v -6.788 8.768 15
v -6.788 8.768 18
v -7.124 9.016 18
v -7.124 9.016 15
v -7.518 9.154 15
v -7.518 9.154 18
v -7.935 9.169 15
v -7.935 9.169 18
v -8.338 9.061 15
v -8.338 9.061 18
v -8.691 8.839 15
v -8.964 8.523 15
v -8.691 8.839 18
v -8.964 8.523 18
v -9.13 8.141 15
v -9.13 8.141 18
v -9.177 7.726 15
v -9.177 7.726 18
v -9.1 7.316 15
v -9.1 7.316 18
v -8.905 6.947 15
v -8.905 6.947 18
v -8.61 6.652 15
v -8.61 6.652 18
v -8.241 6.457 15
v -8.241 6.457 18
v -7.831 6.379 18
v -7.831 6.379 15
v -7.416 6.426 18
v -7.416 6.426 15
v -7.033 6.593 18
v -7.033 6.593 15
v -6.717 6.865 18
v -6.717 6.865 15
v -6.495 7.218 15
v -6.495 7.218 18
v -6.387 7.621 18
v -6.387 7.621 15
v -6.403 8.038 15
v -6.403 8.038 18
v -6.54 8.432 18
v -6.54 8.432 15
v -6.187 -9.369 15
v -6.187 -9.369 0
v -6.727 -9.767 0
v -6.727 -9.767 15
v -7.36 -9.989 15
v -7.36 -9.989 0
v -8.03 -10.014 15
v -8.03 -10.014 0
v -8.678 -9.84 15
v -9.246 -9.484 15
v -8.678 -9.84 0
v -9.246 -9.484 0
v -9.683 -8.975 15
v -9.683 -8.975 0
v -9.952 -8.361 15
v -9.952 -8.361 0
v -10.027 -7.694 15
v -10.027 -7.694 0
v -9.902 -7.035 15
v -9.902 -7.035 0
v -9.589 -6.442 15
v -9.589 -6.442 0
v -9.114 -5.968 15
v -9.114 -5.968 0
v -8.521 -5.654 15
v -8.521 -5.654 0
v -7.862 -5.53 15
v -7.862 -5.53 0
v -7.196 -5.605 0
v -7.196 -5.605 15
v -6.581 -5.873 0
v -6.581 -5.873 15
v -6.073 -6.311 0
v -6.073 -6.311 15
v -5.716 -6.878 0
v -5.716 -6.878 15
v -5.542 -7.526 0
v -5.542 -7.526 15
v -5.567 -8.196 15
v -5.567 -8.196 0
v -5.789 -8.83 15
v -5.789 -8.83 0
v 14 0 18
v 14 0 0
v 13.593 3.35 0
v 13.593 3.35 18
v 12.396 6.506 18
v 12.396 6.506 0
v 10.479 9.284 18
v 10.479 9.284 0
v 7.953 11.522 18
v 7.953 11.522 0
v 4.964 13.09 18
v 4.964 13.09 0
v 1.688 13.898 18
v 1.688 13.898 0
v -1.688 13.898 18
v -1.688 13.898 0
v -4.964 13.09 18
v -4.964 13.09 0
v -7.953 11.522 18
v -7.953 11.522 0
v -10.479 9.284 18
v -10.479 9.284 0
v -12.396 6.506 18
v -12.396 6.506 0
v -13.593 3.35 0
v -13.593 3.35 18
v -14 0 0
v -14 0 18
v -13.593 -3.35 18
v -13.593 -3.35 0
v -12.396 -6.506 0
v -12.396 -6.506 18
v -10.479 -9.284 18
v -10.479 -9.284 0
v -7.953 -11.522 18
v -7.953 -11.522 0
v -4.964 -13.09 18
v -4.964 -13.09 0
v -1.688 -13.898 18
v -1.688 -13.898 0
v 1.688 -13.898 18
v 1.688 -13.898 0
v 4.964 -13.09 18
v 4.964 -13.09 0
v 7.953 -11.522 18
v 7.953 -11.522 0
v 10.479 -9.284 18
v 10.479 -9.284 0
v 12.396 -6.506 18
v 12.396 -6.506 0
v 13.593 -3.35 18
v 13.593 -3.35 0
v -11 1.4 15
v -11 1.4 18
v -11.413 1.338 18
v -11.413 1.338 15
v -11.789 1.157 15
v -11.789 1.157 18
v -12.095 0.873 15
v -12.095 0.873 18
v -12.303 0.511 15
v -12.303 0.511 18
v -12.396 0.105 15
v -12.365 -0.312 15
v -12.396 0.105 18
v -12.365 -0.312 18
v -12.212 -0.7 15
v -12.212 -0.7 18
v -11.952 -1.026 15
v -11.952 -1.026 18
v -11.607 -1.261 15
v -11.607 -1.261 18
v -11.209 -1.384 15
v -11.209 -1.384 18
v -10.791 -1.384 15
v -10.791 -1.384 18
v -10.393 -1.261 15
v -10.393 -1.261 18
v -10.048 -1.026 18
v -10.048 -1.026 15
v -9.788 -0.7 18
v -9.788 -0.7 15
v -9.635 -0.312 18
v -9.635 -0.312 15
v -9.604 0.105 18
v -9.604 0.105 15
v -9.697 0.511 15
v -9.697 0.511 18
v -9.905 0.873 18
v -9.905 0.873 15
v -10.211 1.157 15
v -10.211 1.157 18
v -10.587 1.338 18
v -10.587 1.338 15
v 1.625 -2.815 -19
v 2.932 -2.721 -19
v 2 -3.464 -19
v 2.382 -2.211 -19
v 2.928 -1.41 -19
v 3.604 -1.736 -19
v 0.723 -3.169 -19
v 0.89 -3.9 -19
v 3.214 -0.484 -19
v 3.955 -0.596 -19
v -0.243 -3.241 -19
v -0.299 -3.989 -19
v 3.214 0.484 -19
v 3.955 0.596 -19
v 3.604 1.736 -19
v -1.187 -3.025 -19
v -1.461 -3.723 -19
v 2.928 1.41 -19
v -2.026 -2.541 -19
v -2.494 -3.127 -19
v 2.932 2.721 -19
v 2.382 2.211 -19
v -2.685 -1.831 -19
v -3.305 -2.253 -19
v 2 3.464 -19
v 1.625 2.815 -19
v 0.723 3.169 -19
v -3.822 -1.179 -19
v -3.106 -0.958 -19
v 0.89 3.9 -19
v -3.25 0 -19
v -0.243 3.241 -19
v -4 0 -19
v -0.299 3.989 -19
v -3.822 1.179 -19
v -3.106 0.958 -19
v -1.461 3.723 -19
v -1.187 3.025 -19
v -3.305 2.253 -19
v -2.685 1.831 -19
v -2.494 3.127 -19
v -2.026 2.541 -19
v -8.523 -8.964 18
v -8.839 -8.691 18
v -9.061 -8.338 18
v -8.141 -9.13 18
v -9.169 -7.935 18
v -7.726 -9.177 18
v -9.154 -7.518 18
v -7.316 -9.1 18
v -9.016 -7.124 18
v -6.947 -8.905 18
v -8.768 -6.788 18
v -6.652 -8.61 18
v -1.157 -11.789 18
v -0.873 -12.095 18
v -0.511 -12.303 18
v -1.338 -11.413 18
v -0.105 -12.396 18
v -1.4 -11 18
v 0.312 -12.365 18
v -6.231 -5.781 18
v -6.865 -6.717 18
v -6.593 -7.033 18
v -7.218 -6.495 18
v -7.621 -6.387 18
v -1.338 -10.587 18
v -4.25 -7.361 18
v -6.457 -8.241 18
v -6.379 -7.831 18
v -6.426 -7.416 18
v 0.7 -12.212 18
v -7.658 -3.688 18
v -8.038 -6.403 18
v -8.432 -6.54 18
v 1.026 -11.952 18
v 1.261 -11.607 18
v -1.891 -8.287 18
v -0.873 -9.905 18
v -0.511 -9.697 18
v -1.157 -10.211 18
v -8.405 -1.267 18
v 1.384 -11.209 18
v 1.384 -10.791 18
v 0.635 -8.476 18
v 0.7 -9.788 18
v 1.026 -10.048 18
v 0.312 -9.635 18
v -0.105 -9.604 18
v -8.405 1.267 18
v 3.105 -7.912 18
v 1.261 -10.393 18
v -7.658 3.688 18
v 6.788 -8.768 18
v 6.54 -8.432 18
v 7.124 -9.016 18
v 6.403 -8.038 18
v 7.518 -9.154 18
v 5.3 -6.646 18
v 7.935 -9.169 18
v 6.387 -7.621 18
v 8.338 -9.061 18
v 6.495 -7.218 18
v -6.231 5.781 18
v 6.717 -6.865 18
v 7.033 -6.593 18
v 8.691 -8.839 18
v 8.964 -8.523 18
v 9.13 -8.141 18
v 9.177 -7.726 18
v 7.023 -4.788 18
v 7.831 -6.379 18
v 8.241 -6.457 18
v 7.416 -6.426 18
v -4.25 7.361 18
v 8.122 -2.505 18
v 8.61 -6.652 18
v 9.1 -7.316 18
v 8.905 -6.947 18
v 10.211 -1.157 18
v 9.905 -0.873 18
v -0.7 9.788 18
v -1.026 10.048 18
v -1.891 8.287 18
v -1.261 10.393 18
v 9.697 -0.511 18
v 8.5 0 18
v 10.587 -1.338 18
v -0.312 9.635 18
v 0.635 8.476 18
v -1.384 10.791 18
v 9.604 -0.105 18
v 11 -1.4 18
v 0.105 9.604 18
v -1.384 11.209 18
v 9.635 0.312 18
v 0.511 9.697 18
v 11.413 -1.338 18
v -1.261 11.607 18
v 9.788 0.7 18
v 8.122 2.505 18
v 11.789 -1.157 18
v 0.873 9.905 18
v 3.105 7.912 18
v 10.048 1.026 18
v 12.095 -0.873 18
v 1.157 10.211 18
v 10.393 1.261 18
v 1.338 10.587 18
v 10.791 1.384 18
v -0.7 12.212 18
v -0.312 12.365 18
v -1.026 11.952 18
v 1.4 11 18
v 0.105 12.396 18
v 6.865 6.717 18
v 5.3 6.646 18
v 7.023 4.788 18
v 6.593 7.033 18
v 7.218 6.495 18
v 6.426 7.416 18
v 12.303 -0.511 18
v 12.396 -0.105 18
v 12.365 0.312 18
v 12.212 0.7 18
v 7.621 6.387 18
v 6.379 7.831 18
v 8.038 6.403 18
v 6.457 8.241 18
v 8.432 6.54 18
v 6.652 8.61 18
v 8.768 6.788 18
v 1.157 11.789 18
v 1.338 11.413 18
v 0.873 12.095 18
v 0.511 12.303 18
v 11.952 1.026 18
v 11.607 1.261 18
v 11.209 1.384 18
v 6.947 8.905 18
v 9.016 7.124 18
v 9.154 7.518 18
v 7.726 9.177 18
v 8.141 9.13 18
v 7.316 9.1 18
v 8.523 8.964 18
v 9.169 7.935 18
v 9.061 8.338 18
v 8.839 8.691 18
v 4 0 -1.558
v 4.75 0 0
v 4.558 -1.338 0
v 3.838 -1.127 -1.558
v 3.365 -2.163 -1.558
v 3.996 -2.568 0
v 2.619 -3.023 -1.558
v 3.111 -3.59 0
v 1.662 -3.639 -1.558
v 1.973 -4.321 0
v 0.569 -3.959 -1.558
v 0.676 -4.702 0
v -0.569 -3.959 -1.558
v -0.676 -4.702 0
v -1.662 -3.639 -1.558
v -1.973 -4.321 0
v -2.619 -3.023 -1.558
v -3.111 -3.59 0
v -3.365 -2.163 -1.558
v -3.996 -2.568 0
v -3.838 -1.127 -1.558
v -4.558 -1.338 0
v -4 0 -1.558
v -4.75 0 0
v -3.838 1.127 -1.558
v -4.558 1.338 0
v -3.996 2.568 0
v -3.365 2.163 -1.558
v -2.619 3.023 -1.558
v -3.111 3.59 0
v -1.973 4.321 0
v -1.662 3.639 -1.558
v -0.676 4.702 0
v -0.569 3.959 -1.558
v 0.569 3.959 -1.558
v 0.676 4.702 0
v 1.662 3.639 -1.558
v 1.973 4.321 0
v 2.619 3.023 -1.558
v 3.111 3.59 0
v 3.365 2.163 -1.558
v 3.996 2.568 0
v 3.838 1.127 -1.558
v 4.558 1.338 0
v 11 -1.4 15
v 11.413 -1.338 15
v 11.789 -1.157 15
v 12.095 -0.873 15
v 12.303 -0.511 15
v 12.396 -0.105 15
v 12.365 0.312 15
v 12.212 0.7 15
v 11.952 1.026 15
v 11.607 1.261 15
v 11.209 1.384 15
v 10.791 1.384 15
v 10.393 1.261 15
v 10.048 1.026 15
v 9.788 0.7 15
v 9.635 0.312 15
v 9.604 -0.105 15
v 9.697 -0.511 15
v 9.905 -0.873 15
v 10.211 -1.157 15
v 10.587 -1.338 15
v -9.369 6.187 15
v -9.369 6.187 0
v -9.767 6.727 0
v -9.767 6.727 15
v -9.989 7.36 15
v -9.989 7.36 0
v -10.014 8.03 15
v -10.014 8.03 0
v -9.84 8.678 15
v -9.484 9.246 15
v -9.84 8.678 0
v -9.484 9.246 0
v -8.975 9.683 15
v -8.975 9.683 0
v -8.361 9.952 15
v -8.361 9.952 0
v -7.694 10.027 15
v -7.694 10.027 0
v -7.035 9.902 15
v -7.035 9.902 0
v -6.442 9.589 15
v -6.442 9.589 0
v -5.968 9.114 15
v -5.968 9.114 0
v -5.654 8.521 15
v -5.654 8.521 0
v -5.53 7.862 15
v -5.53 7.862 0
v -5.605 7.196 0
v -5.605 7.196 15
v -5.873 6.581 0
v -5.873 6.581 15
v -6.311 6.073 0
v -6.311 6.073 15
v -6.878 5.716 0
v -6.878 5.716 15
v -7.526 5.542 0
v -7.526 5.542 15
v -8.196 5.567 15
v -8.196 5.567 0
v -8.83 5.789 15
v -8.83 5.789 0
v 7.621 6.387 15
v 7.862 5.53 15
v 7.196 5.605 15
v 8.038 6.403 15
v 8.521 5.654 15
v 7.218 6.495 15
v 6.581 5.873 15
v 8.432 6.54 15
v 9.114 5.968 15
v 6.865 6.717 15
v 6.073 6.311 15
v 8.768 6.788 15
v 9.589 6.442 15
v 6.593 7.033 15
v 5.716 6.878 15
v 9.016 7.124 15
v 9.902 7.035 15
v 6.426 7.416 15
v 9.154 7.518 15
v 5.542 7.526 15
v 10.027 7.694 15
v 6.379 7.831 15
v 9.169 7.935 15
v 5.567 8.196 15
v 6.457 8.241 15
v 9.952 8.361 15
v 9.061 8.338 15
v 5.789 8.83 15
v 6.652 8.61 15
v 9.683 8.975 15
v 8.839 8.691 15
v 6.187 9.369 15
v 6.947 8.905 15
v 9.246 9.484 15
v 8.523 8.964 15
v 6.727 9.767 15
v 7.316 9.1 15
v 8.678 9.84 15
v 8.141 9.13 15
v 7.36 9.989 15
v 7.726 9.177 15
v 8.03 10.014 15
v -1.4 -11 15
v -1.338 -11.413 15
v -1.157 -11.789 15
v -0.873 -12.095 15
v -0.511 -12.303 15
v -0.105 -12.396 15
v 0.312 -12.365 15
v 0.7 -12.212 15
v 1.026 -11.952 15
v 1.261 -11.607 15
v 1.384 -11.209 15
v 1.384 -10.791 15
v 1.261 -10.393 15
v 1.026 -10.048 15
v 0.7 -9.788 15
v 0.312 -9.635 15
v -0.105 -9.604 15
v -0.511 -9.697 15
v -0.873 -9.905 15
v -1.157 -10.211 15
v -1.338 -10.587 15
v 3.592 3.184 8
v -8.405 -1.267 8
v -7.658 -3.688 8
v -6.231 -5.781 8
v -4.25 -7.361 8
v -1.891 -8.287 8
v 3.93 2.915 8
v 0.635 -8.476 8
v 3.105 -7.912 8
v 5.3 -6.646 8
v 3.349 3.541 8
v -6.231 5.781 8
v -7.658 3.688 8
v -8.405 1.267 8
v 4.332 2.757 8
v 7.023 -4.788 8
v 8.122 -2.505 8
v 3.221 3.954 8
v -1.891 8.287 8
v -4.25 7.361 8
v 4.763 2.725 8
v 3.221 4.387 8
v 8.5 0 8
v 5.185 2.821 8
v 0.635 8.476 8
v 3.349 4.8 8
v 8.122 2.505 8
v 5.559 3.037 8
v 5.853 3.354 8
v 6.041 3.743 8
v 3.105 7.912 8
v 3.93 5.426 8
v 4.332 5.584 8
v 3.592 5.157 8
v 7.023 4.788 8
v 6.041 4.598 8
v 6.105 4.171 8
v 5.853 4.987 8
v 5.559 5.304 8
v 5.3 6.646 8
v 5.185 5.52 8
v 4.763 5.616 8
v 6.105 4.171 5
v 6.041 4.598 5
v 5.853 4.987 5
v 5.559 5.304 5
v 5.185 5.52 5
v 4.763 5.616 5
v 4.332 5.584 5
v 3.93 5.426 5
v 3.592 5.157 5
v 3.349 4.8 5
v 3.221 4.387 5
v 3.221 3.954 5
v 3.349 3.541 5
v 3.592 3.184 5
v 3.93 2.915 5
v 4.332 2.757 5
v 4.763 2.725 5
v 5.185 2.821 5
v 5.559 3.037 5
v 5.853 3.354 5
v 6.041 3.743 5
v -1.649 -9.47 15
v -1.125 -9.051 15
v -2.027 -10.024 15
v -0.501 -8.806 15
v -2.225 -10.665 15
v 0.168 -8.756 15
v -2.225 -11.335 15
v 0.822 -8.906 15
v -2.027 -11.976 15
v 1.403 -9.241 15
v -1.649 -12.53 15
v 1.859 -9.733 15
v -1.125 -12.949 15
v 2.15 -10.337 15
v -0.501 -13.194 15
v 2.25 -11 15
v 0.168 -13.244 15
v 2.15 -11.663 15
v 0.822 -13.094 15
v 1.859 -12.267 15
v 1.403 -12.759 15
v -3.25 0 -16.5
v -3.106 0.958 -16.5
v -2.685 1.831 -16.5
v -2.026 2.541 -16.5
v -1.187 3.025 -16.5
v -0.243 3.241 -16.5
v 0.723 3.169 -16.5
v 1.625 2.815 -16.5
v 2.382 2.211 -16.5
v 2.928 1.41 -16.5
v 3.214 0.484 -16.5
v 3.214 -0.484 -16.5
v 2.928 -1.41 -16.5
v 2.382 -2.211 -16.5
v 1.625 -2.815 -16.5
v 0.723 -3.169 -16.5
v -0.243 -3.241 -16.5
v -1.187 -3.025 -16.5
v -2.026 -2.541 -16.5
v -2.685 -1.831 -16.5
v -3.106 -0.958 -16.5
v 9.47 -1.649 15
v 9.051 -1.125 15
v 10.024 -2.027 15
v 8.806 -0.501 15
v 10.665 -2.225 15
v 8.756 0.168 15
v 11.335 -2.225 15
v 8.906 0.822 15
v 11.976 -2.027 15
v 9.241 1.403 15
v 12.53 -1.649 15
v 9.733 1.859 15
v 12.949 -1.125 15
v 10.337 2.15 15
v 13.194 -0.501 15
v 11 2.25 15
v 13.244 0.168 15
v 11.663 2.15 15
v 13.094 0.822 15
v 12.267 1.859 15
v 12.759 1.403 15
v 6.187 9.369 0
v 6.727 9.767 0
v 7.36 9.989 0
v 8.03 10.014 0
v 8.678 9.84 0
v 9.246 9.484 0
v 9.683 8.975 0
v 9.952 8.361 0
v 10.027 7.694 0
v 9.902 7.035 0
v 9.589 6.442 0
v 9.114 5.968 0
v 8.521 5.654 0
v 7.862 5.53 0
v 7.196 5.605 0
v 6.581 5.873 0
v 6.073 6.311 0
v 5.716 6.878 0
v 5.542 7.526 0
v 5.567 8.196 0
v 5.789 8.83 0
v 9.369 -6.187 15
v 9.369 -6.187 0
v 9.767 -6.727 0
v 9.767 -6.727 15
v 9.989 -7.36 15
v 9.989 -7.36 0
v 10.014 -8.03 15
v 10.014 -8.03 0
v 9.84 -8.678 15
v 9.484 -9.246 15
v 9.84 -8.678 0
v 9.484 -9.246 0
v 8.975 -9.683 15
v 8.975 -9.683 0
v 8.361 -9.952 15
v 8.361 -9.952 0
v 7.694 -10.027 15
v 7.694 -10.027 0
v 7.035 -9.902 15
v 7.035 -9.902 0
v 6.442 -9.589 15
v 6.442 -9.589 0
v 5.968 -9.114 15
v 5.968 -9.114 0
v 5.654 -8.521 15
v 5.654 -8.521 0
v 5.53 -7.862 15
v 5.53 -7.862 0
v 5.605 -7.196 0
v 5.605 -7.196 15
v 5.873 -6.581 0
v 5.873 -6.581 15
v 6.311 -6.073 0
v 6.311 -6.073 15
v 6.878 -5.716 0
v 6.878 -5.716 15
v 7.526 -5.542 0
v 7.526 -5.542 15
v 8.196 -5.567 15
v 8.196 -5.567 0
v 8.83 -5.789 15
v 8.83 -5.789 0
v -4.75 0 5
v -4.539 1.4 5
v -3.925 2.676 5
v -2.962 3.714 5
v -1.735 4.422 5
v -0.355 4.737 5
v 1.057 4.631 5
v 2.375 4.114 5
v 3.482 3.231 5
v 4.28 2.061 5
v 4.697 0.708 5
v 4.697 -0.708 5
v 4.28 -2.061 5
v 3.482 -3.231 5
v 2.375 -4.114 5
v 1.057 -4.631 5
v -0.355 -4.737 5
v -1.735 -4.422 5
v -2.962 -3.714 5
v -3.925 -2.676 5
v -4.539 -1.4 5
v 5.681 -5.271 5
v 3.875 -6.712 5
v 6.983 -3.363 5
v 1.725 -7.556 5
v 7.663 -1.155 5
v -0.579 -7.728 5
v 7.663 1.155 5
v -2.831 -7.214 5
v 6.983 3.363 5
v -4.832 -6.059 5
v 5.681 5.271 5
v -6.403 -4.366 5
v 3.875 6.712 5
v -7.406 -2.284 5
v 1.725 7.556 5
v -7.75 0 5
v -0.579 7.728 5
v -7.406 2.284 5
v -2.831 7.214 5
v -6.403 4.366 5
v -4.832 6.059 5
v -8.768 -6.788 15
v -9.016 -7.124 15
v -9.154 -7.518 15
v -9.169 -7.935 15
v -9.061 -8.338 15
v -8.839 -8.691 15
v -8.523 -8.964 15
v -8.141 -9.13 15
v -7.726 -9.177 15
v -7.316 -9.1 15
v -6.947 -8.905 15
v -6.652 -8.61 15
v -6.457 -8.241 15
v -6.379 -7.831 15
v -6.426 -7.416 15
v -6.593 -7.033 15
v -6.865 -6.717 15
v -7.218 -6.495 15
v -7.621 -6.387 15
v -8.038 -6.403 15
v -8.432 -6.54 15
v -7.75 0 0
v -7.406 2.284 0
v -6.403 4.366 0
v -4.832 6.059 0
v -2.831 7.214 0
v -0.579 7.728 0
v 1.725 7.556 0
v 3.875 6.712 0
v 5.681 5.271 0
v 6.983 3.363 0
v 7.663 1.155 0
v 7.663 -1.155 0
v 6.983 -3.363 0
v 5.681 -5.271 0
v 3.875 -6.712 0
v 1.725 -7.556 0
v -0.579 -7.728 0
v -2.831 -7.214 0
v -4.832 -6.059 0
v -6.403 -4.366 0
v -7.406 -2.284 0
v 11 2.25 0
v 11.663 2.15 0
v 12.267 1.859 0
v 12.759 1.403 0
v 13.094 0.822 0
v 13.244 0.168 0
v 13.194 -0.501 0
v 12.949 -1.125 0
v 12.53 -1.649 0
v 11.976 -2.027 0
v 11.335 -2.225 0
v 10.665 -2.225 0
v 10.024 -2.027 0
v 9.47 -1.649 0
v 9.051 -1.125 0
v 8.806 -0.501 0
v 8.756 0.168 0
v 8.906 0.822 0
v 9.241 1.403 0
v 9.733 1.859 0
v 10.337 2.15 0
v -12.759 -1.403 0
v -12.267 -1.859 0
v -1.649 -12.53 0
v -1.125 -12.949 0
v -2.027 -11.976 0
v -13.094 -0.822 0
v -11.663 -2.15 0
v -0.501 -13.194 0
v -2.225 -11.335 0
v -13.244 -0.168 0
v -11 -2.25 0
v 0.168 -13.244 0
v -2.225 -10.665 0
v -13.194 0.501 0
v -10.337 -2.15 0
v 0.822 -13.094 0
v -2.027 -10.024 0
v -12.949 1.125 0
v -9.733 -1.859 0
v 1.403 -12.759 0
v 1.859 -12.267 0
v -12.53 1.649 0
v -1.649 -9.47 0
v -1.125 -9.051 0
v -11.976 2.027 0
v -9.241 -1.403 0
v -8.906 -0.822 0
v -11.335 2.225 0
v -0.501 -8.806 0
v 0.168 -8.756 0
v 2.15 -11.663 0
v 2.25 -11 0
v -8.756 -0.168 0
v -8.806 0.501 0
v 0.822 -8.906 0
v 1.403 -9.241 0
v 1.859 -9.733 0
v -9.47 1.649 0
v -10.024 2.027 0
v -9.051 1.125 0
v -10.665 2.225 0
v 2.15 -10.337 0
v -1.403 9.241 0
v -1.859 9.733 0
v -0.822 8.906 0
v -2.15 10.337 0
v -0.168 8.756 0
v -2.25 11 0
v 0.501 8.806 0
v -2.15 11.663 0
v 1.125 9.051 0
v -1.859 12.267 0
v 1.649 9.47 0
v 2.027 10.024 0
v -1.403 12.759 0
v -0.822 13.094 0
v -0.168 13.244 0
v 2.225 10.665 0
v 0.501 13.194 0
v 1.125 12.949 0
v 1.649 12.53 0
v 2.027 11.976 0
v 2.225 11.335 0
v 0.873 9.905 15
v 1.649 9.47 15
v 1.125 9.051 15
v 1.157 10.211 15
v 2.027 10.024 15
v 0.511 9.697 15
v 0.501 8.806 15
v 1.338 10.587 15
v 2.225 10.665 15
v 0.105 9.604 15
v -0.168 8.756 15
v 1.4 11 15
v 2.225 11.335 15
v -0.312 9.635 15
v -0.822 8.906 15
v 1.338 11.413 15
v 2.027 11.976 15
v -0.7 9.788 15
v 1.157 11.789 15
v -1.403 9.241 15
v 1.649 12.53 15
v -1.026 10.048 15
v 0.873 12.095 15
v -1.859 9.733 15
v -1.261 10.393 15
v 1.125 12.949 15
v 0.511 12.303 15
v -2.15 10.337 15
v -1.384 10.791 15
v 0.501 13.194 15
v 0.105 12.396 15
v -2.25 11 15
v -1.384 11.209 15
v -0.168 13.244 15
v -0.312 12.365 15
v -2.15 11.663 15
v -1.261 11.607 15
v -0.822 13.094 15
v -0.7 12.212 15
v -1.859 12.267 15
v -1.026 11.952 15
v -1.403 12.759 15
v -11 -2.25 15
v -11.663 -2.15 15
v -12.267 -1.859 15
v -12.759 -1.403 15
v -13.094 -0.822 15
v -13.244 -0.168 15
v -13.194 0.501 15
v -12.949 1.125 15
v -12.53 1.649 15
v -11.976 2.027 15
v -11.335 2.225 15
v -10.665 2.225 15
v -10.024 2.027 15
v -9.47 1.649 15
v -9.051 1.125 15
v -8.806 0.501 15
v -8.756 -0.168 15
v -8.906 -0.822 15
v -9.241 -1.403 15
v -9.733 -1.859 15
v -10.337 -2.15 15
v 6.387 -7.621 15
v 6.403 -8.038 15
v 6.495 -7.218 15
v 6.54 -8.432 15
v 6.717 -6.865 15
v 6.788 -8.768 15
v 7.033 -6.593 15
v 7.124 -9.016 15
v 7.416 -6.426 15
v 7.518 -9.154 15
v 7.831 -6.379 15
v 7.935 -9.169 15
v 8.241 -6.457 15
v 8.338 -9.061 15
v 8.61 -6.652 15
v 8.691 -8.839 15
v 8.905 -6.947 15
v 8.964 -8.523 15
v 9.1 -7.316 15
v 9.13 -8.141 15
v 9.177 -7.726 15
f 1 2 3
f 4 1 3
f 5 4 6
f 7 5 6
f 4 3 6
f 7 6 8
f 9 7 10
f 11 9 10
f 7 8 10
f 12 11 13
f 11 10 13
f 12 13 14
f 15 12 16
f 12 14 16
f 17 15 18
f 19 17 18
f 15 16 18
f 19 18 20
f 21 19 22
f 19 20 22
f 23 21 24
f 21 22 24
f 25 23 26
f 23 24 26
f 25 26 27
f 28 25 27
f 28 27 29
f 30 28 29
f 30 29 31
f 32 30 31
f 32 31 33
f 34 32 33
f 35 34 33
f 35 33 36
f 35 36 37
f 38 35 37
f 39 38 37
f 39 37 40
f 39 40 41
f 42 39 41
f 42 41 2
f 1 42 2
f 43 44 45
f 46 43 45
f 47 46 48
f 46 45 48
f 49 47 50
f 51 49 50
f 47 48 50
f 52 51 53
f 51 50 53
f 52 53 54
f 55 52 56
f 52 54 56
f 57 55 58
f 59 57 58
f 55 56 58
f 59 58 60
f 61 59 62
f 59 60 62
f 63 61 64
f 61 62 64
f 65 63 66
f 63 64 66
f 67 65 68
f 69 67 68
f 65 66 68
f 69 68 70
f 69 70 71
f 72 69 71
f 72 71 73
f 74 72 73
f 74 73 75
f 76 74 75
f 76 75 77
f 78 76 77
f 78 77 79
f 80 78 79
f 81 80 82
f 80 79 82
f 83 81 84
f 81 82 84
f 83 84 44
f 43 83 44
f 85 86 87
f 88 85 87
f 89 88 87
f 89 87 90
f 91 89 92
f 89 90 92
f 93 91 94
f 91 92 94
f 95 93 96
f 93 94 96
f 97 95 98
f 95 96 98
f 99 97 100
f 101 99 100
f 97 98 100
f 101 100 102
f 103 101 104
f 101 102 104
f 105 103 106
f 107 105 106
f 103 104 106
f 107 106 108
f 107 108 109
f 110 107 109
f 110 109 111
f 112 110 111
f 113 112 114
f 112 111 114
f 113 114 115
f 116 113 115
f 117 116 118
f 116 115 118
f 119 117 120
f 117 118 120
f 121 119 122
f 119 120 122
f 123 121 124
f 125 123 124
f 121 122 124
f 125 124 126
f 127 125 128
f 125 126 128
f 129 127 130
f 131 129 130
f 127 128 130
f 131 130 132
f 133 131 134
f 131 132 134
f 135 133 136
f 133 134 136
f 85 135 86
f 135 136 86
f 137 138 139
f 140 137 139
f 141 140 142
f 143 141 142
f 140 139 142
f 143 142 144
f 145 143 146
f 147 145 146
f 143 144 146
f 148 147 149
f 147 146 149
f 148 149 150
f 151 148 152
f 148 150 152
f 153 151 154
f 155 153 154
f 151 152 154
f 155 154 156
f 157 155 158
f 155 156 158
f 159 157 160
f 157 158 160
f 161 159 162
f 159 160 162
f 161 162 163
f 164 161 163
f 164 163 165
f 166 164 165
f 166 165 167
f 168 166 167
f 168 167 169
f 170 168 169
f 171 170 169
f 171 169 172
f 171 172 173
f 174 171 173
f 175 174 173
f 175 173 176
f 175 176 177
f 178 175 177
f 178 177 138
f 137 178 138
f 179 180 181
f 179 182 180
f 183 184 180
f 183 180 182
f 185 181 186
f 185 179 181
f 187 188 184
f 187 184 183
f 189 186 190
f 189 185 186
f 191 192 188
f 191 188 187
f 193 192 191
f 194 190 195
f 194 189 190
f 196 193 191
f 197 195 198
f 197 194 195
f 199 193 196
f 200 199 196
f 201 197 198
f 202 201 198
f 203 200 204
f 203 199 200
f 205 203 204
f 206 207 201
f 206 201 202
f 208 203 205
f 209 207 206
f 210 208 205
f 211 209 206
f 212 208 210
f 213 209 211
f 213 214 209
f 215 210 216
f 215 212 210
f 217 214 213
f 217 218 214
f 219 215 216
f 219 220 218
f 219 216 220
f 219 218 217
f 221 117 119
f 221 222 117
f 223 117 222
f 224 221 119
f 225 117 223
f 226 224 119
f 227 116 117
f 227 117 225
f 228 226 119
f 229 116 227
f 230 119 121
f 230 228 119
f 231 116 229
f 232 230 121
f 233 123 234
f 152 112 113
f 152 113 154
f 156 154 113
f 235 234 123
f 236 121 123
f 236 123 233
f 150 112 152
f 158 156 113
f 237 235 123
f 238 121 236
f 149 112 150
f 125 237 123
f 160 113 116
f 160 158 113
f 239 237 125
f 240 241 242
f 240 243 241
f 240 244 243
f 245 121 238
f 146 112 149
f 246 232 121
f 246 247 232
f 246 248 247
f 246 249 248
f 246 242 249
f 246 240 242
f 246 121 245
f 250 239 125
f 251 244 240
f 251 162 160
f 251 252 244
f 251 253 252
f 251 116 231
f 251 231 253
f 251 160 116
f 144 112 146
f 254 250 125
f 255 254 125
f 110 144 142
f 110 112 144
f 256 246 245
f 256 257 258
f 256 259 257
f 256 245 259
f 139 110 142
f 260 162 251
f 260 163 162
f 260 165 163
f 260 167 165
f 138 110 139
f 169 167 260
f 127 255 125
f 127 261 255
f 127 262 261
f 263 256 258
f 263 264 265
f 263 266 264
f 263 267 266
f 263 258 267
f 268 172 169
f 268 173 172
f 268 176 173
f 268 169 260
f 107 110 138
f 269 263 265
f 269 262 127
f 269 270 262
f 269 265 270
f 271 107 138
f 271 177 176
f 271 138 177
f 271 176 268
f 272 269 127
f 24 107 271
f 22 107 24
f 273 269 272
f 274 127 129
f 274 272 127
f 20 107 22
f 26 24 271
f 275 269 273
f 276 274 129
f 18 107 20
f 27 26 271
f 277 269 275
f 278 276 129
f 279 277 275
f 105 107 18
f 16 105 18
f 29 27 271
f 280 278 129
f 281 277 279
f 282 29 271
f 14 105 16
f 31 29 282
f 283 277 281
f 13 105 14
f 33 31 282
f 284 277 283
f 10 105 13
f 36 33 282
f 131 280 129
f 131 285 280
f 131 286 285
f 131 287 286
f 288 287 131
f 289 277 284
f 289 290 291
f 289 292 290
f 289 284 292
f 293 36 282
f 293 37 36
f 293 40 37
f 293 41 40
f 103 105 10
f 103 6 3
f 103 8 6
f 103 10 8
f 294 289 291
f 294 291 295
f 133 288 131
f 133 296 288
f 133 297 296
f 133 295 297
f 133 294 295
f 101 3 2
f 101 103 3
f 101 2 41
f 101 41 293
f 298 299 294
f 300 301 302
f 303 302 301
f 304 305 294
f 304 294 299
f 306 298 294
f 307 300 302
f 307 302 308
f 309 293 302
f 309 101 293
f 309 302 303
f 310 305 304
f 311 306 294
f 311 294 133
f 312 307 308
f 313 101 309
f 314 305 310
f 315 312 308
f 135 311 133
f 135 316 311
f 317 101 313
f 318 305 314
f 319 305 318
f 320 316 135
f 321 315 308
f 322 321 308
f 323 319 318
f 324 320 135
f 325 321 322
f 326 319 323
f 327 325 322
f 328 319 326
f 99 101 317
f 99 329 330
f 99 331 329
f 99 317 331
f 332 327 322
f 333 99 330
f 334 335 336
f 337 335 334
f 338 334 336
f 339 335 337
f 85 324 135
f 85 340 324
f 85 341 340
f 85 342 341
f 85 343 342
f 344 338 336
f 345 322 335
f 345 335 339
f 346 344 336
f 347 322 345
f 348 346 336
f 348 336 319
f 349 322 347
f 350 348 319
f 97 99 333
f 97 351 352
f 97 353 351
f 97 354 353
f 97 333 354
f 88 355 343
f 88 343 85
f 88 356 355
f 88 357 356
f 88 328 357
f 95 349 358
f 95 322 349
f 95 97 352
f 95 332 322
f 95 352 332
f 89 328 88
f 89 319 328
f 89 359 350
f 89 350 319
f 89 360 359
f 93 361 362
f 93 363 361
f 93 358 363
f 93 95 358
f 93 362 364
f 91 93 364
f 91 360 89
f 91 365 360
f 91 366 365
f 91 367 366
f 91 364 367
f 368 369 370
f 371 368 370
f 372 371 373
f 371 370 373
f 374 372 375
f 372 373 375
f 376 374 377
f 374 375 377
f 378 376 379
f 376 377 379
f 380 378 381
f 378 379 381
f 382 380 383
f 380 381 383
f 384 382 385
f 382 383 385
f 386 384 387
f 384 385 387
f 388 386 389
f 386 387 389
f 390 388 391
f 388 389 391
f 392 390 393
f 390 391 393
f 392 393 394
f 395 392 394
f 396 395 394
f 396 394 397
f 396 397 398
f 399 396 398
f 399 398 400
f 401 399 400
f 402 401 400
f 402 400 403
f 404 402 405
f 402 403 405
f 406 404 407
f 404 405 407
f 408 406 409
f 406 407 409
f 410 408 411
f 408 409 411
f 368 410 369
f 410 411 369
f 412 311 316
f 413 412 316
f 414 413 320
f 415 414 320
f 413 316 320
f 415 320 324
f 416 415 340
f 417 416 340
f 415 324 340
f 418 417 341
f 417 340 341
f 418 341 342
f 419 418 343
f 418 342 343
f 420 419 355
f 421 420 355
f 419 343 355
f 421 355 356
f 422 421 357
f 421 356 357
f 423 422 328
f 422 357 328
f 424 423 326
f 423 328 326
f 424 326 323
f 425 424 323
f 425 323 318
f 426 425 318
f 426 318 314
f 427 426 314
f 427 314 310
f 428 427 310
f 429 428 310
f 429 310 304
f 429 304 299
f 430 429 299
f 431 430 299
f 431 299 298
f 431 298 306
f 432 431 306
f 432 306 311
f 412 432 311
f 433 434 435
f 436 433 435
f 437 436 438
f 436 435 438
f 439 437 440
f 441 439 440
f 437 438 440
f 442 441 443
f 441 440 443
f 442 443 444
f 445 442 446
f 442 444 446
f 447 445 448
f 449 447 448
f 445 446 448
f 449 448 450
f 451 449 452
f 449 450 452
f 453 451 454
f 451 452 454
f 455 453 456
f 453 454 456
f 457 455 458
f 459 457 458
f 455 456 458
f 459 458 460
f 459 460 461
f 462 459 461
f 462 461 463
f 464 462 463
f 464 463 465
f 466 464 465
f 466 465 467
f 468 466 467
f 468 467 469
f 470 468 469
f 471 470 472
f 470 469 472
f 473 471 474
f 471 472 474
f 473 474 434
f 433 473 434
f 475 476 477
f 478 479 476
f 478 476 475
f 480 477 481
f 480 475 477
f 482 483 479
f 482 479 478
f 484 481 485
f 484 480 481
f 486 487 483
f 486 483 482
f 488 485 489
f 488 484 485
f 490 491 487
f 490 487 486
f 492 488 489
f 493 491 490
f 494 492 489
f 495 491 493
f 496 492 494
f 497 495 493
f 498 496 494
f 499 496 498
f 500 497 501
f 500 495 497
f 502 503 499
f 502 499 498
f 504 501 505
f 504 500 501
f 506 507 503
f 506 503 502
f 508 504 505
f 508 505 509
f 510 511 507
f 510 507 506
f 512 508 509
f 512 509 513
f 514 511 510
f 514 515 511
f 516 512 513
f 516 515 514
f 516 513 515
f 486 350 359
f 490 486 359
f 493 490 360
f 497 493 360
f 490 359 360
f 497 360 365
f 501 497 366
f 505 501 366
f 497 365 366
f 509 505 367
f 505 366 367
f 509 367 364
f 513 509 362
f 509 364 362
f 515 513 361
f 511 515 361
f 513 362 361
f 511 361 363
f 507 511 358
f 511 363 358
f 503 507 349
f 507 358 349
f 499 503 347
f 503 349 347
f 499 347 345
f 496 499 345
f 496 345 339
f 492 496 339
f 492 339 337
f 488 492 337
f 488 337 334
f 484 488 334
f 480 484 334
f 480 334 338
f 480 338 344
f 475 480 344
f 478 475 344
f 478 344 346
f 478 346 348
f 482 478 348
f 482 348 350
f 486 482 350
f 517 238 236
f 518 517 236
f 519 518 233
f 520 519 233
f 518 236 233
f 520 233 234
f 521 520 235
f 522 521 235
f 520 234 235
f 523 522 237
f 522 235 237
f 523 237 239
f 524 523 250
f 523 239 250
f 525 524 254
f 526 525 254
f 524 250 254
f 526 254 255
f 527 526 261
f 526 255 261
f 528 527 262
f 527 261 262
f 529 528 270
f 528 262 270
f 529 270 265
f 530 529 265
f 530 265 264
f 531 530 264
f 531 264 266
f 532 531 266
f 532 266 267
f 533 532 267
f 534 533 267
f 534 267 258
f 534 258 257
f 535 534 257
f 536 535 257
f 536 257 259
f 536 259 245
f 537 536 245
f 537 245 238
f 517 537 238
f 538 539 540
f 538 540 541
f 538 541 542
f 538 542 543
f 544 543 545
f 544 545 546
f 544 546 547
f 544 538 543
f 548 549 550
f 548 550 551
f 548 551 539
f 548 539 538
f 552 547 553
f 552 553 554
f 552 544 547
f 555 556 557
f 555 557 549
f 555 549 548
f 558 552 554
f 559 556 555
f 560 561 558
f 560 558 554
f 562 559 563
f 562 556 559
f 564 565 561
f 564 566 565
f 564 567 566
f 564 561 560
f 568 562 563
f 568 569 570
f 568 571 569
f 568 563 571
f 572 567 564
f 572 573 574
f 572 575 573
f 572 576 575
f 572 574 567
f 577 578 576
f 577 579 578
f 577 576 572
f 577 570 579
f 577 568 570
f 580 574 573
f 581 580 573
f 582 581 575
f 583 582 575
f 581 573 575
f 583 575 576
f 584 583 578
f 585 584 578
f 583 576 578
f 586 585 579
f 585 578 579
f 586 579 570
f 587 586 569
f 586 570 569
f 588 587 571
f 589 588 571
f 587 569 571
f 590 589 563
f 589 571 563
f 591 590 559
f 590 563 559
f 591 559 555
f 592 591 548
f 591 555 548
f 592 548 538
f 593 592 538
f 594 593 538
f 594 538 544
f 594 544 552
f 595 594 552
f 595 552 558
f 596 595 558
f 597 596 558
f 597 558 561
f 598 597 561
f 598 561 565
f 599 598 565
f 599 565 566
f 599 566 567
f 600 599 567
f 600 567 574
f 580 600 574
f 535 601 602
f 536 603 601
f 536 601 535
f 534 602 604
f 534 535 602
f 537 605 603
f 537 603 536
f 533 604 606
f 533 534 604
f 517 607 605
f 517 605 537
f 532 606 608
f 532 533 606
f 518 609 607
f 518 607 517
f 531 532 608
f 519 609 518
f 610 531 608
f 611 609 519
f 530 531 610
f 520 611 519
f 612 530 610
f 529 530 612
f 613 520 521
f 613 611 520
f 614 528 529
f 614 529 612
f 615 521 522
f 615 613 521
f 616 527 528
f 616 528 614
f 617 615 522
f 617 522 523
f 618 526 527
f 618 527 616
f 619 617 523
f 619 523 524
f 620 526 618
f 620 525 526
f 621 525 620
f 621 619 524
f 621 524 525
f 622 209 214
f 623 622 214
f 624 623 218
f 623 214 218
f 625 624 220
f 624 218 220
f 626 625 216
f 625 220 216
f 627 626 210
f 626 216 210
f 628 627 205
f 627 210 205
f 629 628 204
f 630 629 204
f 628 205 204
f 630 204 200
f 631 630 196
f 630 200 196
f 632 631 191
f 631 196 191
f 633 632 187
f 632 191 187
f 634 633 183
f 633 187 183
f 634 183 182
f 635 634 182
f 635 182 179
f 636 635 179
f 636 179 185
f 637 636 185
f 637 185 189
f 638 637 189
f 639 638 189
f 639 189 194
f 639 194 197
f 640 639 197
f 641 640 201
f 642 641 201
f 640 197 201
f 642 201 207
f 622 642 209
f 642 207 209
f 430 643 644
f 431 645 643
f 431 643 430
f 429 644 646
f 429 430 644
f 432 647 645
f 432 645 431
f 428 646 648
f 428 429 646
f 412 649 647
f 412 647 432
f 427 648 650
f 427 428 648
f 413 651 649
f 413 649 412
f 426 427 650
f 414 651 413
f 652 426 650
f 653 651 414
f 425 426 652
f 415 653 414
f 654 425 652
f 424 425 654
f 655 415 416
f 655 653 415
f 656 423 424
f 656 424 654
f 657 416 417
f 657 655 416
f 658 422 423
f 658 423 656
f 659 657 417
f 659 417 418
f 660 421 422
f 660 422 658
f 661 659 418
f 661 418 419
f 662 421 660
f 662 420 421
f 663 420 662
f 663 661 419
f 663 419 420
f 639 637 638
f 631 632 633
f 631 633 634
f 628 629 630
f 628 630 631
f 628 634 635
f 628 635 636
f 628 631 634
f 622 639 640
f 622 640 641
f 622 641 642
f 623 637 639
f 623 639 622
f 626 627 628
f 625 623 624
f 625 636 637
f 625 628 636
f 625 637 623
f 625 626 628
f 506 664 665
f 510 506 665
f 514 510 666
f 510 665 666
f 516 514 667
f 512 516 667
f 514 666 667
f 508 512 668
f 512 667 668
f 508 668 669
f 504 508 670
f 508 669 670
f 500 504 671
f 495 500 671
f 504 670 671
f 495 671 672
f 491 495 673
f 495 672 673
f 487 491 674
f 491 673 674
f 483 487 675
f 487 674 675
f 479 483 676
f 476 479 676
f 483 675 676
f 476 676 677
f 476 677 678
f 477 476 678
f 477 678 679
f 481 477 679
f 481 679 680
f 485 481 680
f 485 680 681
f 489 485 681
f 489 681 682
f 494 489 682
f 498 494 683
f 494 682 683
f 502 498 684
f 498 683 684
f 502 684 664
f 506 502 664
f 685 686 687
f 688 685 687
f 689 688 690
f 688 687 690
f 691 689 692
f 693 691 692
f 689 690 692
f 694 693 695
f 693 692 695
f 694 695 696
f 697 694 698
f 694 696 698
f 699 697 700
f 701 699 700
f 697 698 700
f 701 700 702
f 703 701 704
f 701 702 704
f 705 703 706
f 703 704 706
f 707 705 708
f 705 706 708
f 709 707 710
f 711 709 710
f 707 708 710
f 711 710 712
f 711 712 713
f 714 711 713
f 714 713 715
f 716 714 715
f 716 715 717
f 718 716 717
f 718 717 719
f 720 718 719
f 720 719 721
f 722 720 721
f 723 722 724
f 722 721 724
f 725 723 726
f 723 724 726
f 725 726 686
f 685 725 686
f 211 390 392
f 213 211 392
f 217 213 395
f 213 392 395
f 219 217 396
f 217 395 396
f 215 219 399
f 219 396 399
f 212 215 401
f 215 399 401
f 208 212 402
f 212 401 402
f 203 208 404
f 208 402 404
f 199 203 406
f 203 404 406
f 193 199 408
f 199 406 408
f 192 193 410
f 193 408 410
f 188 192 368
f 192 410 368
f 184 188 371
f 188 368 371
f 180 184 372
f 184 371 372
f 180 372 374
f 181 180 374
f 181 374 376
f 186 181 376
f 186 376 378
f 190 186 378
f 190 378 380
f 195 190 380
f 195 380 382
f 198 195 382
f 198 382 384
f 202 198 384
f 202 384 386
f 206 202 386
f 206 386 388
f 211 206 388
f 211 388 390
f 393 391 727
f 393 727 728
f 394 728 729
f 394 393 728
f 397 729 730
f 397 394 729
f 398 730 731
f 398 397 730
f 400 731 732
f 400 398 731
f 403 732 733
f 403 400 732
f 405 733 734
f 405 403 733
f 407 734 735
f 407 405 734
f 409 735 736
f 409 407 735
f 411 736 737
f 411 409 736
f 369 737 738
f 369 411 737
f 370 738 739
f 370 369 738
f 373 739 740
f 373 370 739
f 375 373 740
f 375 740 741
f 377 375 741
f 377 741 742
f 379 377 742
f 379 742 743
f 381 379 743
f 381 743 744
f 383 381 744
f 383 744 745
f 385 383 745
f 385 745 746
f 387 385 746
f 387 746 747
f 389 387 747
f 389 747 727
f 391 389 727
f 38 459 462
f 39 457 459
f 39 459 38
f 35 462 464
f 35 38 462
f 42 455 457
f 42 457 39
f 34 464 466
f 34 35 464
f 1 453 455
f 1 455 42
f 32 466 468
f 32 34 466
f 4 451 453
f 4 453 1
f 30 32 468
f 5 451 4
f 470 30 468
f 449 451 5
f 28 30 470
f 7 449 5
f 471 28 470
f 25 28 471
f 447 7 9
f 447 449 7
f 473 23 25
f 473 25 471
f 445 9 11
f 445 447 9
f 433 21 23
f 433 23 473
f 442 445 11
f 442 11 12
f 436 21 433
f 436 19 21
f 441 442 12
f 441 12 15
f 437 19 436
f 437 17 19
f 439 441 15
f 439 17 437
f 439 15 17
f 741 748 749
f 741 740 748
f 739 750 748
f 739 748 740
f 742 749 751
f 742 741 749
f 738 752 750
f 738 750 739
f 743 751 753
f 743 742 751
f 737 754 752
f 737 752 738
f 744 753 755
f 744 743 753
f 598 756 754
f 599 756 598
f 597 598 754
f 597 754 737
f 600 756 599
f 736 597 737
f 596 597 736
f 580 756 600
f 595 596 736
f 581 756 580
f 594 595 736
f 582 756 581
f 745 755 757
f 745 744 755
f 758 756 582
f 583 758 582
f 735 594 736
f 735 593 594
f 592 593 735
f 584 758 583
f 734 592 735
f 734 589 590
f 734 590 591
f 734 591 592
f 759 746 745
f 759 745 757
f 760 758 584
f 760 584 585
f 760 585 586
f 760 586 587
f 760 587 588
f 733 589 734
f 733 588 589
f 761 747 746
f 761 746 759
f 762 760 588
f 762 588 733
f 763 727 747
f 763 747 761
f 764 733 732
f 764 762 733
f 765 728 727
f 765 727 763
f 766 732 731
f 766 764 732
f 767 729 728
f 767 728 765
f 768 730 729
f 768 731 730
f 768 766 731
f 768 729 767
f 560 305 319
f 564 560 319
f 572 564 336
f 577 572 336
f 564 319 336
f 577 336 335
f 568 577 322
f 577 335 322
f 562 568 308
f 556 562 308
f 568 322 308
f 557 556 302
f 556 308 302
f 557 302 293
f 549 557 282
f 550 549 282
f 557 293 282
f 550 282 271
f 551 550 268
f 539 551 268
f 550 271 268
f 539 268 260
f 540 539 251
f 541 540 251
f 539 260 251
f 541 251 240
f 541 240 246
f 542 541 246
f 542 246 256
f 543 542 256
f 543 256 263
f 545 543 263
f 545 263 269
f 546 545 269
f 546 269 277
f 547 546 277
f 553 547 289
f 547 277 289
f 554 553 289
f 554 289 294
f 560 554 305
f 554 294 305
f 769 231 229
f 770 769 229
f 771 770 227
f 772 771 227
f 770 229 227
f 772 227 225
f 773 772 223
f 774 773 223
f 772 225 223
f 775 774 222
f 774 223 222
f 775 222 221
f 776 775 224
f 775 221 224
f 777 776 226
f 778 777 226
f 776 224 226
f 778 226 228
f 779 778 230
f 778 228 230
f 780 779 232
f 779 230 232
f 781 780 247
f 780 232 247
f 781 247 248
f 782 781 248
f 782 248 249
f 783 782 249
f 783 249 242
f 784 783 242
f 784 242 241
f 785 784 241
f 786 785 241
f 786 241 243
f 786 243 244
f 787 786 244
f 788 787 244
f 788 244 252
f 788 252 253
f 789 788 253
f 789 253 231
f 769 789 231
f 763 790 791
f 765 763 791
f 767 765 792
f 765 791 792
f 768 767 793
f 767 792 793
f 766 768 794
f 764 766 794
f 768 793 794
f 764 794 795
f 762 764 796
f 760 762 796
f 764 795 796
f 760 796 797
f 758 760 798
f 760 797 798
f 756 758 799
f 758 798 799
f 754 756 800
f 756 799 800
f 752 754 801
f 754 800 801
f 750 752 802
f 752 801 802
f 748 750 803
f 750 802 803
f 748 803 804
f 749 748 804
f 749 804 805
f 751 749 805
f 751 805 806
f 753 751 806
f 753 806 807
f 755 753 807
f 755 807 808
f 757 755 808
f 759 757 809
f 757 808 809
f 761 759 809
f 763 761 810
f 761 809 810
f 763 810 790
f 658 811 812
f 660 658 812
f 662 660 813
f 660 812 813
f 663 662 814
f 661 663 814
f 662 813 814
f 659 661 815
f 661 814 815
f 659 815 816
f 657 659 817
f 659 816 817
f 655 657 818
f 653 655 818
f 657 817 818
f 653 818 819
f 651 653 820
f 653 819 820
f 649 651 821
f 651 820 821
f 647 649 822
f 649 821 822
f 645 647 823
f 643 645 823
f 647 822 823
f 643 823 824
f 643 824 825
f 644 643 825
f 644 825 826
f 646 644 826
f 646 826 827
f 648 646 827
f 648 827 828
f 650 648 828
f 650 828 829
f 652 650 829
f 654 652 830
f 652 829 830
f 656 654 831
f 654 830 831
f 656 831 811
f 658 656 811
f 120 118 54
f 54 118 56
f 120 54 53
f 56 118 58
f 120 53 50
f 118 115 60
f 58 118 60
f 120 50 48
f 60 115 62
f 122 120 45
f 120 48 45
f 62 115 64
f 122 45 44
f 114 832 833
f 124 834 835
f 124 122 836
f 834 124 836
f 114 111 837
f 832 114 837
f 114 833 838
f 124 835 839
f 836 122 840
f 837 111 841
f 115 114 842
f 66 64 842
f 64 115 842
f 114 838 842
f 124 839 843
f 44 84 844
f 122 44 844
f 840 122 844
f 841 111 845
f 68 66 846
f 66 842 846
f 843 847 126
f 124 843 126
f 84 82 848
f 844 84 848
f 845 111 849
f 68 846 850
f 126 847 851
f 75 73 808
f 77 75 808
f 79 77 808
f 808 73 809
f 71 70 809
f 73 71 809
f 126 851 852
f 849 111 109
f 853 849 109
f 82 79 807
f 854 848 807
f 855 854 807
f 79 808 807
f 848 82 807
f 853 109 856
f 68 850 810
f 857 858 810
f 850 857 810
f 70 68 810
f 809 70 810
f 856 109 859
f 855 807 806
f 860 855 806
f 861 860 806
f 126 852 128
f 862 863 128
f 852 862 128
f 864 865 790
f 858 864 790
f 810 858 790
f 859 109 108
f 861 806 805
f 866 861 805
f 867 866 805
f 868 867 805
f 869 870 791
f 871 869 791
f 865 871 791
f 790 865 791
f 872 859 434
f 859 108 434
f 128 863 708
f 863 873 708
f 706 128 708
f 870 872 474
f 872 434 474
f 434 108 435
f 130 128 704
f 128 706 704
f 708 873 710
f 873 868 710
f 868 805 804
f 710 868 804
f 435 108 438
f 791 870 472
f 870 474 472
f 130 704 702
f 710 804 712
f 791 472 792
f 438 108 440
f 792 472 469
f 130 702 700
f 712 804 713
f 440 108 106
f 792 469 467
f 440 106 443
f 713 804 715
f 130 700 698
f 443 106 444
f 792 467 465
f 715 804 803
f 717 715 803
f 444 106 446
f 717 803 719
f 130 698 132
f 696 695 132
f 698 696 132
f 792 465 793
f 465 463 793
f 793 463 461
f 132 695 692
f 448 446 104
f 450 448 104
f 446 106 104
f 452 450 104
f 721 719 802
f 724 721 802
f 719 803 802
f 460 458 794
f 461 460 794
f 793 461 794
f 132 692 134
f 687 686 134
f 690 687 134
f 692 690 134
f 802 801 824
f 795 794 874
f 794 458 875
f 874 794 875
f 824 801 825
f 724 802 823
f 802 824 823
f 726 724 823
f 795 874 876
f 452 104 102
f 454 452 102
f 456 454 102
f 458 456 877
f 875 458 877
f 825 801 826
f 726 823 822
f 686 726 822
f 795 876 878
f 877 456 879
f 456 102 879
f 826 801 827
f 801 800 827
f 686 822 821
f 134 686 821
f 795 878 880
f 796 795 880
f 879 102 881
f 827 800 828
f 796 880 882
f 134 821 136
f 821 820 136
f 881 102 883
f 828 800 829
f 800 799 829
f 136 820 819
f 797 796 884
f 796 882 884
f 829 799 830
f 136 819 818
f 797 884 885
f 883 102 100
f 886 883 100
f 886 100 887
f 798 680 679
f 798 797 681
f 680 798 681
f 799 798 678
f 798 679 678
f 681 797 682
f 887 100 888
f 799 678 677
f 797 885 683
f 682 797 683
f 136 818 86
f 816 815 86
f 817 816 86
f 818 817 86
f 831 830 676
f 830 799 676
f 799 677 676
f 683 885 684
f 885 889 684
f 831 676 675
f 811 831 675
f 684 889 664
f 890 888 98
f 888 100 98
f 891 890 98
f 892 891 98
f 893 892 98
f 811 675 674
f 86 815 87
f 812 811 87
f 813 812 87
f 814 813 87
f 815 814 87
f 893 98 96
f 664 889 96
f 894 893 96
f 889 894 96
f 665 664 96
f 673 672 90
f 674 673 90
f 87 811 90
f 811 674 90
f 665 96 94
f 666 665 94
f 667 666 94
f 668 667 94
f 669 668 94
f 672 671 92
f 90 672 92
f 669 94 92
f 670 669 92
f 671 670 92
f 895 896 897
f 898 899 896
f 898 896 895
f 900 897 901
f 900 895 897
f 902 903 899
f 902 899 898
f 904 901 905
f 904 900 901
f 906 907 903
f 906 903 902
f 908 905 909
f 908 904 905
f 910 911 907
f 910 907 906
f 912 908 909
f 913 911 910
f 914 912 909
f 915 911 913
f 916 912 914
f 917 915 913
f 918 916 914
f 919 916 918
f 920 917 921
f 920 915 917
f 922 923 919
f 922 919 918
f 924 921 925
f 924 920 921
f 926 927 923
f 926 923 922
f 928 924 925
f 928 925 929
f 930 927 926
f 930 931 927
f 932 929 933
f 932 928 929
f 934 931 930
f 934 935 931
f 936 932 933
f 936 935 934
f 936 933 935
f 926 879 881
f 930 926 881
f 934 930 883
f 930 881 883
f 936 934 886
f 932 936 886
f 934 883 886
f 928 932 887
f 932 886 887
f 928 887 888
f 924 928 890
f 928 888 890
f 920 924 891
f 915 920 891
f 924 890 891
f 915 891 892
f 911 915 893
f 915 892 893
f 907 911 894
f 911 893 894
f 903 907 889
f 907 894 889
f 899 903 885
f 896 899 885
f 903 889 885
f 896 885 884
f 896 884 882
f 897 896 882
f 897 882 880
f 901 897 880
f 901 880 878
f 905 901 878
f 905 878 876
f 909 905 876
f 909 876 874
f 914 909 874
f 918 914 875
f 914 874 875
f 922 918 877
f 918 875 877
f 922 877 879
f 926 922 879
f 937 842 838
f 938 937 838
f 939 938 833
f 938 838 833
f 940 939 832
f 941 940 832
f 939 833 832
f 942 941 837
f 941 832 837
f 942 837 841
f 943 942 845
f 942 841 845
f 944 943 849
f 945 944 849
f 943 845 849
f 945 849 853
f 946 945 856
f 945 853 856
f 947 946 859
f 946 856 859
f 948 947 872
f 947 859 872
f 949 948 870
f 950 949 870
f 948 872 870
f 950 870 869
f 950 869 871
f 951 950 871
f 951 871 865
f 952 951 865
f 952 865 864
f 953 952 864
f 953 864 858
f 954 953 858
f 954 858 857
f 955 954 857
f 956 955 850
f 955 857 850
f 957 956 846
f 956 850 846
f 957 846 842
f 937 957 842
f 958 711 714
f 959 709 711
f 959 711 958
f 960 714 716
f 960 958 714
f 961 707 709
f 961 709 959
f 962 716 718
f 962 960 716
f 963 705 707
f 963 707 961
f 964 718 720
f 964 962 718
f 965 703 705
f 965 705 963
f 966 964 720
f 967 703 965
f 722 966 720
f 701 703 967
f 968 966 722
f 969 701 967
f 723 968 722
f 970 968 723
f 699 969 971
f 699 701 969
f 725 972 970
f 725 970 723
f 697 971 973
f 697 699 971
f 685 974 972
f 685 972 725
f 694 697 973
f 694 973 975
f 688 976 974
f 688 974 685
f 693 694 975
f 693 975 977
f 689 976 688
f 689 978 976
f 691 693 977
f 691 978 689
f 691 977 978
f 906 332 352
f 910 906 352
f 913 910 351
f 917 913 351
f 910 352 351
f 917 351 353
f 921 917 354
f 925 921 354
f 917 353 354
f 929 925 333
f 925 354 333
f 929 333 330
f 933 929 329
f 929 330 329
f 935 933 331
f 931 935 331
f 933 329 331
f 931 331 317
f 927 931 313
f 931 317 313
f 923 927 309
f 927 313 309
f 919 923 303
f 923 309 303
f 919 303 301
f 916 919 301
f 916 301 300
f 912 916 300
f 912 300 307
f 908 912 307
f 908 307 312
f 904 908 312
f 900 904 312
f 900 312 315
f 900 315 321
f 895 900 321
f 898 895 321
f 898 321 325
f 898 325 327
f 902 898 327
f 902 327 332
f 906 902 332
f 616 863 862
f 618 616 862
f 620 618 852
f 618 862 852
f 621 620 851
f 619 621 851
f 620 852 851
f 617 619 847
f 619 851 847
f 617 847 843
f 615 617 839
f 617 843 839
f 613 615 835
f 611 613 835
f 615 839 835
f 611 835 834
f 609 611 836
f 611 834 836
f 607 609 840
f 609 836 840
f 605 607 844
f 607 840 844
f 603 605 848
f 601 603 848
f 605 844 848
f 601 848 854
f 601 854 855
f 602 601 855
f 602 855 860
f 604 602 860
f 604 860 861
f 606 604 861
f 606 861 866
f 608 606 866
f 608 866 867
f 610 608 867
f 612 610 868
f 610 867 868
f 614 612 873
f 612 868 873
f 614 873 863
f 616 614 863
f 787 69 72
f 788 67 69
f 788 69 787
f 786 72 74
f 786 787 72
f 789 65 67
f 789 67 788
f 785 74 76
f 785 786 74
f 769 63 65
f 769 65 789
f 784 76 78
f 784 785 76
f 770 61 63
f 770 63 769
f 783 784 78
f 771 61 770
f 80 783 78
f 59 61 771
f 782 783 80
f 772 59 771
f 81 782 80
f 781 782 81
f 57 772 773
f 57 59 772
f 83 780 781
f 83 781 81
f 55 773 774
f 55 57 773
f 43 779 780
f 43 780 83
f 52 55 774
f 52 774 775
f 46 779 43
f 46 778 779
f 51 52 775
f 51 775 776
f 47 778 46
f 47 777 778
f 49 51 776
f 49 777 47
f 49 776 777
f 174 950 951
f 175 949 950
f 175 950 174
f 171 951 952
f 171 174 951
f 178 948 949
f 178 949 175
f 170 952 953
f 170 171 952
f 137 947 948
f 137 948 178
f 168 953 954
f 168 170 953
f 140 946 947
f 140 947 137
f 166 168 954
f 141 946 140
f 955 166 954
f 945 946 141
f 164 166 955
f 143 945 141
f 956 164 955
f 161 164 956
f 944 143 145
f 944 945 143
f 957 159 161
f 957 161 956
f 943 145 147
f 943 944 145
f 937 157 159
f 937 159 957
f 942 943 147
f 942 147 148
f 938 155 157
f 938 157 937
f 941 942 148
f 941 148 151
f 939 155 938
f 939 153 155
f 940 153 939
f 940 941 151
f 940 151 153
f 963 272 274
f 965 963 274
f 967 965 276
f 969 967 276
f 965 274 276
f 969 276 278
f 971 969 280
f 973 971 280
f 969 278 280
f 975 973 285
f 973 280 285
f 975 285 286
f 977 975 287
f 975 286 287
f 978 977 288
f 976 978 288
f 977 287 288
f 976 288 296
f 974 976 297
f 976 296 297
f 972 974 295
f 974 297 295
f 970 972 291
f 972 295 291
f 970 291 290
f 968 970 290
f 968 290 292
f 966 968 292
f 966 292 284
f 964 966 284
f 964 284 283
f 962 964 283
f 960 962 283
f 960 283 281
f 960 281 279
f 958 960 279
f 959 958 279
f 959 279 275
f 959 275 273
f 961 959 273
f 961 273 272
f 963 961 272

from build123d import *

# Parameters (mm, degrees)
SKETCH1_R           = 14
BOSS_EXTRUDE1_DEPTH = 18
SKETCH2_R           = 1.45
CUT_EXTRUDE1_DEPTH  = 15
SKETCH3_R           = 1.4
CUT_EXTRUDE2_DEPTH  = 6
CIRPATTERN1_COUNT   = 8
SKETCH5_R           = 2.25
CUT_EXTRUDE3_DEPTH  = 15
CIRPATTERN2_COUNT   = 8
SKETCH6_R           = 4
BOSS_EXTRUDE2_DEPTH = 19
SKETCH7_R           = 8.5
CUT_EXTRUDE4_DEPTH  = 10
SKETCH8_R           = 7.75
SKETCH8_R_2         = 4.75
CUT_EXTRUDE5_DEPTH  = 5
SKETCH10_R          = 3.25
CUT_EXTRUDE6_DEPTH  = 2.5


with BuildPart() as part:
    # Sketch1 → Boss-Extrude1 (new body)
    with BuildSketch(Plane.XY):
        Circle(SKETCH1_R)
    extrude(amount=BOSS_EXTRUDE1_DEPTH)

    # Sketch2 → Cut-Extrude1 (cut)
    with BuildSketch(Plane.XY.offset(18)):
        with Locations((4.655041669, 4.170502016)):
            Circle(SKETCH2_R)
    extrude(amount=-CUT_EXTRUDE1_DEPTH, mode=Mode.SUBTRACT)

    # Sketch3 → Cut-Extrude2 (cut)
    with BuildSketch(Plane.XY.offset(18)):
        with Locations((0, 11)):
            Circle(SKETCH3_R)
    cut_extrude2 = extrude(amount=-CUT_EXTRUDE2_DEPTH, mode=Mode.SUBTRACT)

    # CirPattern1: Cut-Extrude2 ×8 about axis
    cirpattern1_axis = Axis((0, 0, 0), (0, 0, 1))
    for i in range(1, CIRPATTERN1_COUNT):
        add(cut_extrude2.rotate(cirpattern1_axis, i * 360 / CIRPATTERN1_COUNT), mode=Mode.SUBTRACT)

    # Sketch5 → Cut-Extrude3 (cut)
    with BuildSketch(Plane(origin=(0, 0, 0), x_dir=(-1, 0, 0), z_dir=(0, 0, -1))):
        with Locations((0, 11)):
            Circle(SKETCH5_R)
    cut_extrude3 = extrude(amount=-CUT_EXTRUDE3_DEPTH, mode=Mode.SUBTRACT)

    # CirPattern2: Cut-Extrude3 ×8 about axis
    cirpattern2_axis = Axis((0, 0, 0), (0, 0, 1))
    for i in range(1, CIRPATTERN2_COUNT):
        add(cut_extrude3.rotate(cirpattern2_axis, i * 360 / CIRPATTERN2_COUNT), mode=Mode.SUBTRACT)

    # Sketch6 → Boss-Extrude2 (add)
    with BuildSketch(Plane(origin=(0, 0, 0), x_dir=(-1, 0, 0), z_dir=(0, 0, -1))):
        Circle(SKETCH6_R)
    extrude(amount=BOSS_EXTRUDE2_DEPTH)

    # Sketch7 → Cut-Extrude4 (cut)
    with BuildSketch(Plane.XY.offset(18)):
        Circle(SKETCH7_R)
    extrude(amount=-CUT_EXTRUDE4_DEPTH, mode=Mode.SUBTRACT)

    # Sketch8 → Cut-Extrude5 (cut)
    with BuildSketch(Plane(origin=(0, 0, 0), x_dir=(-1, 0, 0), z_dir=(0, 0, -1))):
        Circle(SKETCH8_R)
        Circle(SKETCH8_R_2, mode=Mode.SUBTRACT)
    extrude(amount=-CUT_EXTRUDE5_DEPTH, mode=Mode.SUBTRACT)

    # Sketch9 → Revolve1 (revolve)
    with BuildSketch(Plane(origin=(0, 0, 0), x_dir=(1, 0, 0), z_dir=(0, 1, 0))):
        Polygon((4, 1.55754099), (4.75, 0), (4, 0), align=None)
    revolve(axis=Axis((0, 0, 18), (0, 0, -1)))

    # Sketch10 → Cut-Extrude6 (cut)
    with BuildSketch(Plane(origin=(0, 0, -19), x_dir=(-1, 0, 0), z_dir=(0, 0, -1))):
        Circle(SKETCH10_R)
    extrude(amount=-CUT_EXTRUDE6_DEPTH, mode=Mode.SUBTRACT)


solid = part.part
